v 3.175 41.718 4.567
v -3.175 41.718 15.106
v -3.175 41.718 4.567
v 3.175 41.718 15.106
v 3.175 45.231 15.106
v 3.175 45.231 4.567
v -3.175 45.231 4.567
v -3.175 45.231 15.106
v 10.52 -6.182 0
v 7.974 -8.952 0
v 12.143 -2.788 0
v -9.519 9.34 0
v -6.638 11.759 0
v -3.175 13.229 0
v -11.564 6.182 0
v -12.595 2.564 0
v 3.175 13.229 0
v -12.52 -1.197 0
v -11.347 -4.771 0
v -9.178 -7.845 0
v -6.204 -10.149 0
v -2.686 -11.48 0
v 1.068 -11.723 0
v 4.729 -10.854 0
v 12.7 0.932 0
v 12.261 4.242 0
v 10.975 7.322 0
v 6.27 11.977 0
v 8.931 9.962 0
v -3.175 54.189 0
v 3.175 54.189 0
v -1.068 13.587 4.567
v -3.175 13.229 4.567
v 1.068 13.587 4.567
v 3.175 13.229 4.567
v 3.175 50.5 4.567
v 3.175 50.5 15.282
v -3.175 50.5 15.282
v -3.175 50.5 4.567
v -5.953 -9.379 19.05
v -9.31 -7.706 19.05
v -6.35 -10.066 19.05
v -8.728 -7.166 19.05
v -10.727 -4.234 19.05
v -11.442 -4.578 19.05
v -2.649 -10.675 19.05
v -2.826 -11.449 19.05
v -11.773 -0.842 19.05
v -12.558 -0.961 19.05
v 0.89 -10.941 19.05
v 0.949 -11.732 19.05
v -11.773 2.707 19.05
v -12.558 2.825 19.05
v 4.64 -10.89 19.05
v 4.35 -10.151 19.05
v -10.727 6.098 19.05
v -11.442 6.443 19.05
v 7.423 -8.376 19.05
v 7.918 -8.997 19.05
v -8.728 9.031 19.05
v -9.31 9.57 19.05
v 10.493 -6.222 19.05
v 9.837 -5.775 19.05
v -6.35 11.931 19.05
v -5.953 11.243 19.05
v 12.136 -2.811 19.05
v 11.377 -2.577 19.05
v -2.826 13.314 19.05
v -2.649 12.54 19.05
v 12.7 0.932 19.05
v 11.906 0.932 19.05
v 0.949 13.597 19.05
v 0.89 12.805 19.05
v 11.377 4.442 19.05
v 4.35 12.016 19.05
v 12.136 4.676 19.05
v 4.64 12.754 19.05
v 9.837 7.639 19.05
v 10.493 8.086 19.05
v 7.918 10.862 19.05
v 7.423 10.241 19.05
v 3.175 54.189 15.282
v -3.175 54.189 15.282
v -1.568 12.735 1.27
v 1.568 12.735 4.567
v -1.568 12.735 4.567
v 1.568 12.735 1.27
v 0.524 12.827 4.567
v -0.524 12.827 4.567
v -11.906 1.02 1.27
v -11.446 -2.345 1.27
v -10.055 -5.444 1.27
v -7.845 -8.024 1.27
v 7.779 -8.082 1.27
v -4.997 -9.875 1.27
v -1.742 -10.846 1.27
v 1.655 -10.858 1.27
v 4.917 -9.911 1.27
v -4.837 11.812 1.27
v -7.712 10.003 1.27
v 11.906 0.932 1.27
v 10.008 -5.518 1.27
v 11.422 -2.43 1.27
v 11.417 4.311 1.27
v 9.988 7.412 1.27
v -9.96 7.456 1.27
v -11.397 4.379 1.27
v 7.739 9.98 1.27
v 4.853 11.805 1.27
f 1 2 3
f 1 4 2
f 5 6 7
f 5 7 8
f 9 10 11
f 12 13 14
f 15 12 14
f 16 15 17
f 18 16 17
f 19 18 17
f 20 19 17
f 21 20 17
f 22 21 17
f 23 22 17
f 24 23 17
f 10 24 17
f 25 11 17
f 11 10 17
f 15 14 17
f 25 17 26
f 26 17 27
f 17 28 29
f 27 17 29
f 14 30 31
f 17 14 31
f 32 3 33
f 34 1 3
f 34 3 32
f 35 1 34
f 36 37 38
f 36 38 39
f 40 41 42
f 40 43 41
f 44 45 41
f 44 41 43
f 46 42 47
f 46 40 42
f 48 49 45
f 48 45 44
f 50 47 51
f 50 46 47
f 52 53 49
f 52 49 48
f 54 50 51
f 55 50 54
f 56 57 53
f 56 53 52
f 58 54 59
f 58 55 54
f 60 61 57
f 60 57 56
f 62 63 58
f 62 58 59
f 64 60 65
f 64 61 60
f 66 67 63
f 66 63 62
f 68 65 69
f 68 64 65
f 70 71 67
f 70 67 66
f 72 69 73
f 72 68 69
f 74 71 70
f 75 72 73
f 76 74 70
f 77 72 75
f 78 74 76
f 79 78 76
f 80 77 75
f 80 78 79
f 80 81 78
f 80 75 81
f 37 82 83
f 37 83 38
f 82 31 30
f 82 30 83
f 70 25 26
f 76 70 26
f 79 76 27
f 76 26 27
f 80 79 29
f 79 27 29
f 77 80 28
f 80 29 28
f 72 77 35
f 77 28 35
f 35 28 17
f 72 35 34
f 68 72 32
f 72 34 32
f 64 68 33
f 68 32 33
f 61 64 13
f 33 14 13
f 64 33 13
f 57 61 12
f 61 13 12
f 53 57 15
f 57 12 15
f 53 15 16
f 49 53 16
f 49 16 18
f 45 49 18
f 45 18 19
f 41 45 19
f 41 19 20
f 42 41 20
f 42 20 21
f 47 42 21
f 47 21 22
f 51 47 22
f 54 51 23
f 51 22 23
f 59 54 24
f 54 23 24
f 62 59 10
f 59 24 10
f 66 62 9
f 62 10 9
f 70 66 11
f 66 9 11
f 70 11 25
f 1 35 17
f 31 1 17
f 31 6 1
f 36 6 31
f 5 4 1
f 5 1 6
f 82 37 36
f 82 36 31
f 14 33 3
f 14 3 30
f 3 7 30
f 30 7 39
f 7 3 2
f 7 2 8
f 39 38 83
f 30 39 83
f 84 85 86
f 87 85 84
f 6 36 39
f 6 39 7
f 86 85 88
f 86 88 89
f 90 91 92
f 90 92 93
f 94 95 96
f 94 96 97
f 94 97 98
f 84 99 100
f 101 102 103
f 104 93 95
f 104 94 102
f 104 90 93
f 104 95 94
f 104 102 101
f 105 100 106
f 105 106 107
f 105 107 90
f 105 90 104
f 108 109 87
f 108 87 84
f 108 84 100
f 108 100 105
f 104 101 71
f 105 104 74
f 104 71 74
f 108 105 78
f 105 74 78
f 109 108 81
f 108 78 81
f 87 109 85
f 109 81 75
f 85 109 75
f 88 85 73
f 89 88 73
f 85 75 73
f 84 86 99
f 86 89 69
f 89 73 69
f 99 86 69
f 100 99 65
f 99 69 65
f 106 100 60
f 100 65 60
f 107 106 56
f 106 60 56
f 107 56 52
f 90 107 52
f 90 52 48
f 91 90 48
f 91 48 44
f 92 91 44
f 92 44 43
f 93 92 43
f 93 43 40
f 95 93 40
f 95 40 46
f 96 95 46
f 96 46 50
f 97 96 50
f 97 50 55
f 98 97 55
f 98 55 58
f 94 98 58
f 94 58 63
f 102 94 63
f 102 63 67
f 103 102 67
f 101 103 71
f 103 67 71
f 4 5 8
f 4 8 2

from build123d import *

# Parameters (mm, degrees)
F0_R     = 12.7
F1_DEPTH = 19.05
F2_R     = 11.90625
F3_DEPTH = 17.78
F5_DEPTH = 3.175


with BuildPart() as f1:
    # F0 (on Top) → F1 (new body)
    with BuildSketch(Plane.XY):
        with Locations((0, 0.932285)):
            Circle(F0_R)
    extrude(amount=F1_DEPTH)

    # F2 (on face) → F3 (cut)
    with BuildSketch(Plane.XY.offset(19.05)):
        with Locations((0, 0.932285)):
            Circle(F2_R)
    extrude(amount=-F3_DEPTH, mode=Mode.SUBTRACT)

    # F4 (on Right) → F5 (join, symmetric)
    with BuildSketch(Plane.YZ):
        Polygon((12.734854, 4.566981), (12.734854, 0), (54.188989, 0), (54.188989, 4.566981), (54.188989, 15.281822), (50.500277, 15.281822), (50.500277, 4.566981), (45.230679, 4.566981), (45.230679, 15.106169), (41.717619, 15.106169), (41.717619, 4.566981), align=None)
    extrude(amount=F5_DEPTH, both=True)


solid = f1.part
